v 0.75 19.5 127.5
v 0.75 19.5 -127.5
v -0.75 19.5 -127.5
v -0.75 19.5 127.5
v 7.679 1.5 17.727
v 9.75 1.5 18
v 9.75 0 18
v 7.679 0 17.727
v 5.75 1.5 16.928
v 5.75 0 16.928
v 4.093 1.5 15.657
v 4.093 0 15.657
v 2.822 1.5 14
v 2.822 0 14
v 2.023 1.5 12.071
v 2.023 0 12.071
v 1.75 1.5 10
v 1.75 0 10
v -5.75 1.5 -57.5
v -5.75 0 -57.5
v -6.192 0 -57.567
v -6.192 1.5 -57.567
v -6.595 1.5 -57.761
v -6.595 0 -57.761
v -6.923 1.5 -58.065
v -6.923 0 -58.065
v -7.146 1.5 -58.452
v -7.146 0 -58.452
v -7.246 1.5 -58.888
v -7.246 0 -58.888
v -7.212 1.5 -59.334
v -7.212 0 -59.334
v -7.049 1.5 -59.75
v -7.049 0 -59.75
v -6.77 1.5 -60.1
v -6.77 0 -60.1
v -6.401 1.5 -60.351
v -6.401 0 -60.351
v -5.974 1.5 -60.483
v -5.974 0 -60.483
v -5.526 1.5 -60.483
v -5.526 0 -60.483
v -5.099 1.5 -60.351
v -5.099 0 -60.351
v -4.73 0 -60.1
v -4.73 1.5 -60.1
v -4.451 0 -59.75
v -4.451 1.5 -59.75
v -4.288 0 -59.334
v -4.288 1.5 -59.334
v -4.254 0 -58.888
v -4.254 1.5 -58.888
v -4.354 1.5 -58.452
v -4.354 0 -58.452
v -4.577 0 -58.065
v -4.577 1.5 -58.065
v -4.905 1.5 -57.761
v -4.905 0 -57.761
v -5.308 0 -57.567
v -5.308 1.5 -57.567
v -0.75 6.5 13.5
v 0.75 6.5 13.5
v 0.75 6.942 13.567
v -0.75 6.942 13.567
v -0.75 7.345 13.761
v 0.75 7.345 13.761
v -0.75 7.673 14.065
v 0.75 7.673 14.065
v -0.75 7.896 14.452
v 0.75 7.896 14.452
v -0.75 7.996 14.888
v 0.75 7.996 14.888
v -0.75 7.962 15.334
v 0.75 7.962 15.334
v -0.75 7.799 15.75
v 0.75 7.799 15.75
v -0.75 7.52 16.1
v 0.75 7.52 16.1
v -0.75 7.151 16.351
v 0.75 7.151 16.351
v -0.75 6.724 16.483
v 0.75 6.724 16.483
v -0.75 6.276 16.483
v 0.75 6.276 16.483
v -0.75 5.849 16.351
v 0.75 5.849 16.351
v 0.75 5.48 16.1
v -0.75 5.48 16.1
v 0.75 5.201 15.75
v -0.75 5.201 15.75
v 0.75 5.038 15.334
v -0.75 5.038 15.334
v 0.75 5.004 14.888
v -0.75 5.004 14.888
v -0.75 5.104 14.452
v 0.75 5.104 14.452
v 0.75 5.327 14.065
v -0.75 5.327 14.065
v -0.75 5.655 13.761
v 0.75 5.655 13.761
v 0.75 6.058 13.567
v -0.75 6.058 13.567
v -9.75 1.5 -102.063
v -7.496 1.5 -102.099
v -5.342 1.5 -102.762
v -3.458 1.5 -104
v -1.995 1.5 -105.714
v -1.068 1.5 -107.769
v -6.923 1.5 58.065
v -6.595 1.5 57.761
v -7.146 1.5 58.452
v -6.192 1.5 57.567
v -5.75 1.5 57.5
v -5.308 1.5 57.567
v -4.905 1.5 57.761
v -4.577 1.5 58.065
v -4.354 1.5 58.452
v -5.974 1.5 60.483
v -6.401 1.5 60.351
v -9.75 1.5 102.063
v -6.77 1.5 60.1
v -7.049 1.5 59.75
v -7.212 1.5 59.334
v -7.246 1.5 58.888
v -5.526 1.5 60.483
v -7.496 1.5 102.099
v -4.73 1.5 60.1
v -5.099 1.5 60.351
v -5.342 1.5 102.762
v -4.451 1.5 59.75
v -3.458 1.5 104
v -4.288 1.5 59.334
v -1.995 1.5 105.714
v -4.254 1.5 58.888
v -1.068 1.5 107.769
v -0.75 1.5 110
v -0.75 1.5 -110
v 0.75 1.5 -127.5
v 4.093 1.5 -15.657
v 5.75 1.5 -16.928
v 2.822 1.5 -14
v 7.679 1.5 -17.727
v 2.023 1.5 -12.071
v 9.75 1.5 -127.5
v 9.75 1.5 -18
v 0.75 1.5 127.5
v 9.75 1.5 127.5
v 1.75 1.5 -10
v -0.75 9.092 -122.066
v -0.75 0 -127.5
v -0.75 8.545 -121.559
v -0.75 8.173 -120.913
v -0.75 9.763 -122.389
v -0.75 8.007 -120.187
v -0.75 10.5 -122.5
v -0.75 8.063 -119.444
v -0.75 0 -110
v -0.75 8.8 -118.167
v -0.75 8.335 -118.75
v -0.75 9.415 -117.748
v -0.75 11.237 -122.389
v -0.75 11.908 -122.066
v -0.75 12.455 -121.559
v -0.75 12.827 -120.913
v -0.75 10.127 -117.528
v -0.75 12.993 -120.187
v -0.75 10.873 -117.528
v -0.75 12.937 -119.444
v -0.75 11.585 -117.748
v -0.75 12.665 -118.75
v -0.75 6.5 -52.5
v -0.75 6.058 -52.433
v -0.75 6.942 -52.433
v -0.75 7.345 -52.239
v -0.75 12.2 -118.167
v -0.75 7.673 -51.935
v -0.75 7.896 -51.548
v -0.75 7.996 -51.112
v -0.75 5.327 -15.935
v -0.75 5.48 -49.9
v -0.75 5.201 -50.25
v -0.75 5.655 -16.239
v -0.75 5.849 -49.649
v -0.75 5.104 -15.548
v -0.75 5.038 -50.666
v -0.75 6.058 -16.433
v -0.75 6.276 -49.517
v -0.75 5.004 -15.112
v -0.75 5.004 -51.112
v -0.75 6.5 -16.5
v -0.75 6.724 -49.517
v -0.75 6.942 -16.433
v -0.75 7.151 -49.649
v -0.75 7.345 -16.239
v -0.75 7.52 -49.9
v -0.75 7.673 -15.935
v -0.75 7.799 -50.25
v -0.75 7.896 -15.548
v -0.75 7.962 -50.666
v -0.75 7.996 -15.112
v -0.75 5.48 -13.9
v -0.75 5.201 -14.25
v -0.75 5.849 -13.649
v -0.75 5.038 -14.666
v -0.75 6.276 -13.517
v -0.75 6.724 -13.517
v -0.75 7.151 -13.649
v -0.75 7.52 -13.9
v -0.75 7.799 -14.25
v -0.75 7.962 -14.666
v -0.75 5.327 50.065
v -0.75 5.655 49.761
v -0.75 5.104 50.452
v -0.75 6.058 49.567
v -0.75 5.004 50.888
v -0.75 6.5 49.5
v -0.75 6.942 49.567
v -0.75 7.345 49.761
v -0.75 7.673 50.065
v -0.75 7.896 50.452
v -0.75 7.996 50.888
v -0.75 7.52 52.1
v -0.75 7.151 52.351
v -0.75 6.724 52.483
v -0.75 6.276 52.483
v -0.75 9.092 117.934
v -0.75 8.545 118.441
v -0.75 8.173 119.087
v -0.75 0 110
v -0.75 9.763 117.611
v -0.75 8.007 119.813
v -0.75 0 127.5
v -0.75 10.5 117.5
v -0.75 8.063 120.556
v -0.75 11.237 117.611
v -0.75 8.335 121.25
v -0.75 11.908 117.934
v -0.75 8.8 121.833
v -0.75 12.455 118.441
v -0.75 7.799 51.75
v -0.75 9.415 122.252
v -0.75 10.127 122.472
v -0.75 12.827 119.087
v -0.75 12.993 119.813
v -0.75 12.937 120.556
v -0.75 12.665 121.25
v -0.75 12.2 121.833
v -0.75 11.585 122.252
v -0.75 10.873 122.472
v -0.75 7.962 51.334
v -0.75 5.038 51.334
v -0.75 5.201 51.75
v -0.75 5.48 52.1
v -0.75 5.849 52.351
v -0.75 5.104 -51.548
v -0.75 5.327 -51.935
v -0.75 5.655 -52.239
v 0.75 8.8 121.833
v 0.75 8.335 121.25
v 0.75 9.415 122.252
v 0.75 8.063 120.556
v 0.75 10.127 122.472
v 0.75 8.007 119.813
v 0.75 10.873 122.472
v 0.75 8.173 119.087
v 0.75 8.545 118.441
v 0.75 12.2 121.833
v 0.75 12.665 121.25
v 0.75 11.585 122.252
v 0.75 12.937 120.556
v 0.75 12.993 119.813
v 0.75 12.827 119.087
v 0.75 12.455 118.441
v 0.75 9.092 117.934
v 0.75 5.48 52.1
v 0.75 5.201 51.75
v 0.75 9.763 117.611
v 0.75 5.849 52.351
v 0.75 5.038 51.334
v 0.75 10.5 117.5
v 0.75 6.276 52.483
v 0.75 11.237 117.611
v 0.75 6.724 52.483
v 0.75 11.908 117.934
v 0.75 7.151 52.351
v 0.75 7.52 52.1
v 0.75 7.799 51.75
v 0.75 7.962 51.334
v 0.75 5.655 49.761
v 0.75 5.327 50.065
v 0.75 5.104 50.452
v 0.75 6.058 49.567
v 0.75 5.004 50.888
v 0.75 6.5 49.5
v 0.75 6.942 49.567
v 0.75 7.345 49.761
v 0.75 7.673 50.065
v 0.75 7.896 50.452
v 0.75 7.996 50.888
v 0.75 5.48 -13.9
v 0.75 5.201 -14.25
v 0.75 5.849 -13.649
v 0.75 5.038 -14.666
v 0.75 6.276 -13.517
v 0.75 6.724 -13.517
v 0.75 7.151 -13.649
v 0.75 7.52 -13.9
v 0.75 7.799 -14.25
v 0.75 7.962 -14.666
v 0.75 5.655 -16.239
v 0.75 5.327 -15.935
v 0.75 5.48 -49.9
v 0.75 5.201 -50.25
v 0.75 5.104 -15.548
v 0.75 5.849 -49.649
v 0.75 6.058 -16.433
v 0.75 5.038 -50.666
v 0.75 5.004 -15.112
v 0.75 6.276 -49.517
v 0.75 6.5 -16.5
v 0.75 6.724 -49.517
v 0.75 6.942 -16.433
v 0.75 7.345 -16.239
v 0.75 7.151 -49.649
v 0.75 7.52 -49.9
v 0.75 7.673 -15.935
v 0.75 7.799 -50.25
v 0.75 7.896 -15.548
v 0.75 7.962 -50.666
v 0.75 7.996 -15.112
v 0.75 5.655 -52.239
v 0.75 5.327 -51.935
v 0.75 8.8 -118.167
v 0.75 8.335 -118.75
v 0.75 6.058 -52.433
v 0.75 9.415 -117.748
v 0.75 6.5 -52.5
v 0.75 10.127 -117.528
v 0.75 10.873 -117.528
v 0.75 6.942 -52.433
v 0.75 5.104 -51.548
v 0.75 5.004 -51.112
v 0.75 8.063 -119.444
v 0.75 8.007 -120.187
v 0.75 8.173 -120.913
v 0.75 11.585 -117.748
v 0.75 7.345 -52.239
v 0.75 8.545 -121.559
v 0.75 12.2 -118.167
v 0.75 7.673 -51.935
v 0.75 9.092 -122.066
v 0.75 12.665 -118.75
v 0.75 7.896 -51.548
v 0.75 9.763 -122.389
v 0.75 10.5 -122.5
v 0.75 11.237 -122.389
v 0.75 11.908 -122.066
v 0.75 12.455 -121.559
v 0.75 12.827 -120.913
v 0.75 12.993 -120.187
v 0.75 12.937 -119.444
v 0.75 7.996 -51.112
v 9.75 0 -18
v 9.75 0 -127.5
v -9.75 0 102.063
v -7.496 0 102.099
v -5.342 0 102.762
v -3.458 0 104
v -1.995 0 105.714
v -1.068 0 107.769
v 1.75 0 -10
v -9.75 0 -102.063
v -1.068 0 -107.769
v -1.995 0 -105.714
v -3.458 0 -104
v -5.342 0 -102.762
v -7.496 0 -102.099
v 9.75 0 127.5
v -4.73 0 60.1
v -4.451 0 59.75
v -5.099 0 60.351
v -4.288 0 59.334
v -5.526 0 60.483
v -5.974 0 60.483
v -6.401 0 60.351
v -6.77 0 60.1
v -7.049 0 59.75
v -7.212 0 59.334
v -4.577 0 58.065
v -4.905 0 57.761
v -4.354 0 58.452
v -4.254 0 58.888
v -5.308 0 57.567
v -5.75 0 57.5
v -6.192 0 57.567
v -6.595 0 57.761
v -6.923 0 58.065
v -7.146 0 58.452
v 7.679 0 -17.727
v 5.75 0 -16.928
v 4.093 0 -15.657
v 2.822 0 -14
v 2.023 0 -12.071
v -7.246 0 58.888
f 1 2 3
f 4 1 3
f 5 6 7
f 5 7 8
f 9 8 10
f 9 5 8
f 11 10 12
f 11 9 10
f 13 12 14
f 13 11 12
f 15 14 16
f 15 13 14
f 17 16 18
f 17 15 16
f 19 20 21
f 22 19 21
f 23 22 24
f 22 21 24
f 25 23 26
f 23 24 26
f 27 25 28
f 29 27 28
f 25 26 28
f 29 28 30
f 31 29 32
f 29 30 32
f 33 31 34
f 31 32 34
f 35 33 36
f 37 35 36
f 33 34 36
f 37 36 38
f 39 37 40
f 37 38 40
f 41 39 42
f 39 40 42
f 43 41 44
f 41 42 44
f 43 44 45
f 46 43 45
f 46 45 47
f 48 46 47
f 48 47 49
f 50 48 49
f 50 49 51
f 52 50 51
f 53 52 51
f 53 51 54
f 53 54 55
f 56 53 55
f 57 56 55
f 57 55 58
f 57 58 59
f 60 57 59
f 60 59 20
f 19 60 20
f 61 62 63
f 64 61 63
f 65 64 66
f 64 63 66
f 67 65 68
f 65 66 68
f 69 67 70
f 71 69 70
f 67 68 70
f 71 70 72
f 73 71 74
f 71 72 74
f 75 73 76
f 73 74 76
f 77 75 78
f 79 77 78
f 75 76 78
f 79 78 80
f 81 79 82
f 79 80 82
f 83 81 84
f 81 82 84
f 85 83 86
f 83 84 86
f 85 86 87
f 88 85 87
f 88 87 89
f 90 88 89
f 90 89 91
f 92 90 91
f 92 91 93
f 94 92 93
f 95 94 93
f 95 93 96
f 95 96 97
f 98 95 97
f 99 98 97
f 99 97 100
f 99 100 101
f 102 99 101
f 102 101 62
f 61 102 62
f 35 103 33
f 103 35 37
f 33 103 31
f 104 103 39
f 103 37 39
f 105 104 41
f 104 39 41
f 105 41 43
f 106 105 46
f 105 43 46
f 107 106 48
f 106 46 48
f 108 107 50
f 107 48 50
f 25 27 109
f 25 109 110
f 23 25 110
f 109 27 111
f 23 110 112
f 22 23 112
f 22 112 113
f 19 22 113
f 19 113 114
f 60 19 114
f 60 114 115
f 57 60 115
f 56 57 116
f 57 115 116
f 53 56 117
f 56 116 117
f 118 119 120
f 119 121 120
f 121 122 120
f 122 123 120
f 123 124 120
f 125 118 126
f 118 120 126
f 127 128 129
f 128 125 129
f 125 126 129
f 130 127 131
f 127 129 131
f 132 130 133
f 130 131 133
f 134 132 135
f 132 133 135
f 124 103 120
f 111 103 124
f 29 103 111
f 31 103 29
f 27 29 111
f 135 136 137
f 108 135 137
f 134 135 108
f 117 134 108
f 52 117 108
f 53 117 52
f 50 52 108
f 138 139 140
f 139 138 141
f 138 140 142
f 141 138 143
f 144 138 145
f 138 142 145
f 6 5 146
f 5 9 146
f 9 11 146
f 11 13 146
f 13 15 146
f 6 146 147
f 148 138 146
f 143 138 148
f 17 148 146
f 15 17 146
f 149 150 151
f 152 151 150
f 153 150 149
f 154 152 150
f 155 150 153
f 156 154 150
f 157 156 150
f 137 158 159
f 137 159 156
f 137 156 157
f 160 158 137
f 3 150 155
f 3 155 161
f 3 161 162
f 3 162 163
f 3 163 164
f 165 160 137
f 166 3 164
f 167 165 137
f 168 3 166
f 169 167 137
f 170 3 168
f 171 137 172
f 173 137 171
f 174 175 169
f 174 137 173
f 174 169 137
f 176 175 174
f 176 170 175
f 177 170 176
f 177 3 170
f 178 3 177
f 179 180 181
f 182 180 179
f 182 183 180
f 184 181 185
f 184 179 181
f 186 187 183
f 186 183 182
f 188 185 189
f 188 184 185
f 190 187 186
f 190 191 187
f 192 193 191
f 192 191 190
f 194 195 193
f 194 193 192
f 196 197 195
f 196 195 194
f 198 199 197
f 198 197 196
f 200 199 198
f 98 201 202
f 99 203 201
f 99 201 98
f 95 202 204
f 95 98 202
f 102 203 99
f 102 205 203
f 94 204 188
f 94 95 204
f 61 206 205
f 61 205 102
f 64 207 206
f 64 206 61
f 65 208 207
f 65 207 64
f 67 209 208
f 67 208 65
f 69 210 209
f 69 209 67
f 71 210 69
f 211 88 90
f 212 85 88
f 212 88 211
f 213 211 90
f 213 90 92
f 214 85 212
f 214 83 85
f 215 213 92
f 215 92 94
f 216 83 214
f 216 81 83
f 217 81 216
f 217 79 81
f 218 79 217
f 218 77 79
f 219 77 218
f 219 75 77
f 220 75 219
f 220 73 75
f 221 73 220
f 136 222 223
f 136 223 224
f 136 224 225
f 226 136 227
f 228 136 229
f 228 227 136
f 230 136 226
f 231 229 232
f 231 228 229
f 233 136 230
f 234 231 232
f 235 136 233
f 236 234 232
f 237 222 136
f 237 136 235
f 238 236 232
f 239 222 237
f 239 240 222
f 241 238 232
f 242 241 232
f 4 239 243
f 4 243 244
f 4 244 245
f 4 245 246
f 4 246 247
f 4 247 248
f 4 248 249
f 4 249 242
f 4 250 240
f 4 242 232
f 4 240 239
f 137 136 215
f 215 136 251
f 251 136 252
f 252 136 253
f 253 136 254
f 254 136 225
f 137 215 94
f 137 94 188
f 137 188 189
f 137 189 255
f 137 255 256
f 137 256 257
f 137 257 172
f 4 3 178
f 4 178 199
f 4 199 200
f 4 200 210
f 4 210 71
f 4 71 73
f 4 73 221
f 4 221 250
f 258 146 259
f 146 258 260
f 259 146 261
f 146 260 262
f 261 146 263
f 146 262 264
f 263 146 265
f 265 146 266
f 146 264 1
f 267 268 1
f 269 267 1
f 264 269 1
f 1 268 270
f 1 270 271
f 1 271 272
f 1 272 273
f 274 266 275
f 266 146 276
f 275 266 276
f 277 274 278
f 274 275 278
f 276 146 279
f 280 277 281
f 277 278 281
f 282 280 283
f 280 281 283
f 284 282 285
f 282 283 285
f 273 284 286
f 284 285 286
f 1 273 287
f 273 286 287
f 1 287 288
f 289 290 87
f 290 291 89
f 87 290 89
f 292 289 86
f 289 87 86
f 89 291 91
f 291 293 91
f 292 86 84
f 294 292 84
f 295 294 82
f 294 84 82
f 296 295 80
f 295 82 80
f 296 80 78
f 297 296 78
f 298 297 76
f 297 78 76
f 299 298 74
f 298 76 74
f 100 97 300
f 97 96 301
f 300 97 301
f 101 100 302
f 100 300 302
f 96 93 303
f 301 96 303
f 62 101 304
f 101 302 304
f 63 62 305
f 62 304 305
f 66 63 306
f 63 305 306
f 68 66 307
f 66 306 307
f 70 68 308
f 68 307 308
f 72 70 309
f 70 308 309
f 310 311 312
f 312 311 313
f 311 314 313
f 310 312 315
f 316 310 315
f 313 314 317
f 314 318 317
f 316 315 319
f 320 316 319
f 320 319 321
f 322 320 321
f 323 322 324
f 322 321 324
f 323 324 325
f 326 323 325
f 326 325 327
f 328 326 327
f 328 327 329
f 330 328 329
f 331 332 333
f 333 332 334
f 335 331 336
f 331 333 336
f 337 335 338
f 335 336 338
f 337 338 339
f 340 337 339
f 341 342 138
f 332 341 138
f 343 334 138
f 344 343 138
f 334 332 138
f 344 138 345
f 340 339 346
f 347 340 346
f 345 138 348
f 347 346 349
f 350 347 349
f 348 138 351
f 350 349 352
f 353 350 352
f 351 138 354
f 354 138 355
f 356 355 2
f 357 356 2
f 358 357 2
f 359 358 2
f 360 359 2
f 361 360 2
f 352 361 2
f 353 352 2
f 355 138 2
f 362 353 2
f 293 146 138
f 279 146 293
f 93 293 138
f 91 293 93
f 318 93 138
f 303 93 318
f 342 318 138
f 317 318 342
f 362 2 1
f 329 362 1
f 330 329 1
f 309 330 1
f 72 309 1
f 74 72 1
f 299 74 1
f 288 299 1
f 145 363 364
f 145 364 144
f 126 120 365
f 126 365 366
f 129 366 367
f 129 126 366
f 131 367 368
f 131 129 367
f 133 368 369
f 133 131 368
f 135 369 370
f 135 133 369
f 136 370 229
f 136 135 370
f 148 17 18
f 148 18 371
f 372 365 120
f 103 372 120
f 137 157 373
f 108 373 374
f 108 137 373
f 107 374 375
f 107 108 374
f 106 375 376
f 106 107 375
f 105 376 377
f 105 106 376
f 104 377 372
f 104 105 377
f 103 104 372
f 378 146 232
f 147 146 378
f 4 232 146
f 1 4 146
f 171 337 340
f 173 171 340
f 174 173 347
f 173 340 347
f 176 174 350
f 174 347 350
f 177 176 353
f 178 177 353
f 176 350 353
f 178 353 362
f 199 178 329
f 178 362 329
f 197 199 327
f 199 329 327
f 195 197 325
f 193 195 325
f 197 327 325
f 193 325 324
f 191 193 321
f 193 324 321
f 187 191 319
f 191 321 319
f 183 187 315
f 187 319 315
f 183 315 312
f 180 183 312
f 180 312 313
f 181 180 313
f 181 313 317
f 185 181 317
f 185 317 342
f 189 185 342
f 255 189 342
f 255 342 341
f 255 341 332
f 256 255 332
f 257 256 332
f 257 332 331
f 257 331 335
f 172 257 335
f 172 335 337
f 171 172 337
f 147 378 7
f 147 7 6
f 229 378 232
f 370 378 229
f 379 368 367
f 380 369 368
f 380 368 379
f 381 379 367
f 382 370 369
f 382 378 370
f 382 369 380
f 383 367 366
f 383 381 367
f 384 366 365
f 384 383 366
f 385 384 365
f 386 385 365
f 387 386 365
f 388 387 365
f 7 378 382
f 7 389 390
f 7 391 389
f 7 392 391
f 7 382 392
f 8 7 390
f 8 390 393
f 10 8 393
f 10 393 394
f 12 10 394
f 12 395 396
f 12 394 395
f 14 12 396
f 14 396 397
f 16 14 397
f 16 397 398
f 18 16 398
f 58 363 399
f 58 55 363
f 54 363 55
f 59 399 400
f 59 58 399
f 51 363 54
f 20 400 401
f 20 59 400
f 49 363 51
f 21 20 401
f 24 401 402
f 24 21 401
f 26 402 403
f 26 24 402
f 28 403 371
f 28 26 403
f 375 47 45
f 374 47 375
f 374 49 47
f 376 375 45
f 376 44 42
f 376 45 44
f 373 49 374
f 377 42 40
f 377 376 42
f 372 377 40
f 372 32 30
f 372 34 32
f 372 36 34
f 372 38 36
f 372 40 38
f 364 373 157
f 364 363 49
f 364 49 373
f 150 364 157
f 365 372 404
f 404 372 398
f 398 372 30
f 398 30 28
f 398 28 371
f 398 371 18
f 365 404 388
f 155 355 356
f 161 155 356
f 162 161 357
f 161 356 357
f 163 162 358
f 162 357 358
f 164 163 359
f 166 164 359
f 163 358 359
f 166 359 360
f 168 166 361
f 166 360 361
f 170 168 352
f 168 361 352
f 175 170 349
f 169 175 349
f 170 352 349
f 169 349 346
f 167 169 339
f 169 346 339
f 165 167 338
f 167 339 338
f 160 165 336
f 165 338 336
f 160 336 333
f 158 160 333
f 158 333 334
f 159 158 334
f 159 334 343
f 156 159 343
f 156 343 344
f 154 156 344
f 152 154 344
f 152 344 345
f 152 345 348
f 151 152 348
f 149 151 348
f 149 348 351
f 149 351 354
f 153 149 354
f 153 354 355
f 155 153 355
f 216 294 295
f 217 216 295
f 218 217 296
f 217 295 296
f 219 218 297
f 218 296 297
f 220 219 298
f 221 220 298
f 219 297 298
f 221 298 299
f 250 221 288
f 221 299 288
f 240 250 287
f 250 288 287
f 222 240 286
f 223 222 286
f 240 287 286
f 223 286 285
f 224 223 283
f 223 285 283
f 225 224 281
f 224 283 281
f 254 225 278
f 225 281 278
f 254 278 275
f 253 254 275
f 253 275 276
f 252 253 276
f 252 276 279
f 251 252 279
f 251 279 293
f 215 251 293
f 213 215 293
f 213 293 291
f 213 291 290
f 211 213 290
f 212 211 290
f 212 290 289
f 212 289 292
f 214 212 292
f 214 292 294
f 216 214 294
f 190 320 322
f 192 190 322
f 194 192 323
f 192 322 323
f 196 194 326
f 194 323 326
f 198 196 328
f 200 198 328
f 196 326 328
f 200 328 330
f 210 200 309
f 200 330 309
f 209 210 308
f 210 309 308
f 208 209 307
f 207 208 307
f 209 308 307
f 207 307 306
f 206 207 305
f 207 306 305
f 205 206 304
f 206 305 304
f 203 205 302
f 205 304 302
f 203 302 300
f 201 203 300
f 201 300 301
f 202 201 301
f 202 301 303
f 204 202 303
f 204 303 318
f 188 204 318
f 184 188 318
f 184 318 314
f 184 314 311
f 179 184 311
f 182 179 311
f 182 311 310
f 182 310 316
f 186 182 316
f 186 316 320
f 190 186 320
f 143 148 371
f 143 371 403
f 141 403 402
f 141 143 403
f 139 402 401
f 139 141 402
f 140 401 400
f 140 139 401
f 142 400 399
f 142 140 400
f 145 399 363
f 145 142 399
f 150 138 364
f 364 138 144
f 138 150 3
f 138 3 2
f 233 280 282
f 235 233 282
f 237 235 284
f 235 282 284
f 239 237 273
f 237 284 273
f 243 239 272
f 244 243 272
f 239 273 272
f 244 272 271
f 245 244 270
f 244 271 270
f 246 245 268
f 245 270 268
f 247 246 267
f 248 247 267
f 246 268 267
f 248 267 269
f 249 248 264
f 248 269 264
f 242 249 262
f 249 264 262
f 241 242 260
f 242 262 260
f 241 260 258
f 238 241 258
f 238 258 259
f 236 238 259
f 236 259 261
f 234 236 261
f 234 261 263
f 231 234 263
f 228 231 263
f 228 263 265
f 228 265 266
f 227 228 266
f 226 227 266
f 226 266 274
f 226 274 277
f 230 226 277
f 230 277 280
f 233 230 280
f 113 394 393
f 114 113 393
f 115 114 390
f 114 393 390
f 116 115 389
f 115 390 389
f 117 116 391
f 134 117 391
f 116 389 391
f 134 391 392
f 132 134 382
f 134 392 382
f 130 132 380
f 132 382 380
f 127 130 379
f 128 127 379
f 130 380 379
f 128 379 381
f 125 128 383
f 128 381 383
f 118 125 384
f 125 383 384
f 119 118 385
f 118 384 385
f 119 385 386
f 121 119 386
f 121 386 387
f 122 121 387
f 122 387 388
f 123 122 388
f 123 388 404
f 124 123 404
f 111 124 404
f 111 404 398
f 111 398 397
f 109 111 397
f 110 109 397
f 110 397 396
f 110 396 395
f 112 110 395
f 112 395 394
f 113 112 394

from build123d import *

# Parameters (mm, degrees)
ESQUISSE1_W             = 19.5
ESQUISSE1_H             = 1.5
EXTRU_MINCE1_DEPTH      = 127.5
ESQUISSE2_W             = 1.5
ESQUISSE2_H             = 19.5
EXTRU_MINCE2_DEPTH      = 255
ENL_V_MAT_EXTRU_1_DEPTH = 130.132925701
ESQUISSE4_R             = 2.5
ENL_V_MAT_EXTRU_2_DEPTH = 130.409234601
ESQUISSE5_R             = 1.5
ENL_V_MAT_EXTRU_3_DEPTH = 130.350541166
ESQUISSE6_R             = 1.5
ENL_V_MAT_EXTRU_4_DEPTH = 130.409234601


with BuildPart() as part:
    # Esquisse1 → Extru.-Mince1 (new, symmetric)
    with BuildSketch(Plane.XY):
        with Locations((0, 0.75)):
            Rectangle(ESQUISSE1_W, ESQUISSE1_H)
    extrude(amount=EXTRU_MINCE1_DEPTH, both=True)

    # Esquisse2 → Extru.-Mince2 (add)
    with BuildSketch(Plane(origin=(0, 0, -127.5), x_dir=(-1, 0, 0), z_dir=(0, 0, -1))):
        with Locations((0, 9.75)):
            Rectangle(ESQUISSE2_W, ESQUISSE2_H)
    extrude(amount=-EXTRU_MINCE2_DEPTH)

    # Esquisse3 → Enlèv. mat.-Extru.1 (cut, through all)
    with BuildSketch(Plane(origin=(0, 1.5, 0), x_dir=(1, 0, 0), z_dir=(0, 1, 0))):
        with BuildLine():
            Line((-0.75, 127.5), (-0.75, 110))
            ThreePointArc((-0.75, 110), (-8.75, 102), (-16.75, 110))
            Line((-16.75, 110), (-16.75, 127.5))
            ThreePointArc((-16.75, 127.5), (-8.75, 135.5), (-0.75, 127.5))
        make_face()
        with BuildLine():
            Line((17.75, 10), (17.75, -10))
            ThreePointArc((17.75, -10), (9.75, -18), (1.75, -10))
            Line((1.75, -10), (1.75, 10))
            ThreePointArc((1.75, 10), (9.75, 18), (17.75, 10))
        make_face()
        with BuildLine():
            Line((-16.75, -127.5), (-16.75, -110))
            ThreePointArc((-16.75, -110), (-8.75, -102), (-0.75, -110))
            Line((-0.75, -110), (-0.75, -127.5))
            ThreePointArc((-0.75, -127.5), (-8.75, -135.5), (-16.75, -127.5))
        make_face()
    extrude(amount=-ENL_V_MAT_EXTRU_1_DEPTH, mode=Mode.SUBTRACT)

    # Esquisse4 → Enlèv. mat.-Extru.2 (cut, through all)
    with BuildSketch(Plane(origin=(0.75, 0, 0), x_dir=(0, 0, -1), z_dir=(1, 0, 0))):
        with Locations((-120, 10.5)):
            Circle(ESQUISSE4_R)
        with Locations((120, 10.5)):
            Circle(ESQUISSE4_R)
    extrude(amount=-ENL_V_MAT_EXTRU_2_DEPTH, mode=Mode.SUBTRACT)

    # Esquisse5 → Enlèv. mat.-Extru.3 (cut, through all)
    with BuildSketch(Plane.XZ):
        with Locations(Location((-5.75, 59, 0), (0, 0, 270))):
            Circle(ESQUISSE5_R)
        with Locations(Location((-5.75, -59, 0), (0, 0, 90))):
            Circle(ESQUISSE5_R)
    extrude(amount=-ENL_V_MAT_EXTRU_3_DEPTH, mode=Mode.SUBTRACT)

    # Esquisse6 → Enlèv. mat.-Extru.4 (cut, through all)
    with BuildSketch(Plane(origin=(0.75, 0, 0), x_dir=(0, 0, -1), z_dir=(1, 0, 0))):
        with Locations((-51, 6.5)):
            Circle(ESQUISSE6_R)
        with Locations((-15, 6.5)):
            Circle(ESQUISSE6_R)
        with Locations((15, 6.5)):
            Circle(ESQUISSE6_R)
        with Locations((51, 6.5)):
            Circle(ESQUISSE6_R)
    extrude(amount=-ENL_V_MAT_EXTRU_4_DEPTH, mode=Mode.SUBTRACT)


solid = part.part
